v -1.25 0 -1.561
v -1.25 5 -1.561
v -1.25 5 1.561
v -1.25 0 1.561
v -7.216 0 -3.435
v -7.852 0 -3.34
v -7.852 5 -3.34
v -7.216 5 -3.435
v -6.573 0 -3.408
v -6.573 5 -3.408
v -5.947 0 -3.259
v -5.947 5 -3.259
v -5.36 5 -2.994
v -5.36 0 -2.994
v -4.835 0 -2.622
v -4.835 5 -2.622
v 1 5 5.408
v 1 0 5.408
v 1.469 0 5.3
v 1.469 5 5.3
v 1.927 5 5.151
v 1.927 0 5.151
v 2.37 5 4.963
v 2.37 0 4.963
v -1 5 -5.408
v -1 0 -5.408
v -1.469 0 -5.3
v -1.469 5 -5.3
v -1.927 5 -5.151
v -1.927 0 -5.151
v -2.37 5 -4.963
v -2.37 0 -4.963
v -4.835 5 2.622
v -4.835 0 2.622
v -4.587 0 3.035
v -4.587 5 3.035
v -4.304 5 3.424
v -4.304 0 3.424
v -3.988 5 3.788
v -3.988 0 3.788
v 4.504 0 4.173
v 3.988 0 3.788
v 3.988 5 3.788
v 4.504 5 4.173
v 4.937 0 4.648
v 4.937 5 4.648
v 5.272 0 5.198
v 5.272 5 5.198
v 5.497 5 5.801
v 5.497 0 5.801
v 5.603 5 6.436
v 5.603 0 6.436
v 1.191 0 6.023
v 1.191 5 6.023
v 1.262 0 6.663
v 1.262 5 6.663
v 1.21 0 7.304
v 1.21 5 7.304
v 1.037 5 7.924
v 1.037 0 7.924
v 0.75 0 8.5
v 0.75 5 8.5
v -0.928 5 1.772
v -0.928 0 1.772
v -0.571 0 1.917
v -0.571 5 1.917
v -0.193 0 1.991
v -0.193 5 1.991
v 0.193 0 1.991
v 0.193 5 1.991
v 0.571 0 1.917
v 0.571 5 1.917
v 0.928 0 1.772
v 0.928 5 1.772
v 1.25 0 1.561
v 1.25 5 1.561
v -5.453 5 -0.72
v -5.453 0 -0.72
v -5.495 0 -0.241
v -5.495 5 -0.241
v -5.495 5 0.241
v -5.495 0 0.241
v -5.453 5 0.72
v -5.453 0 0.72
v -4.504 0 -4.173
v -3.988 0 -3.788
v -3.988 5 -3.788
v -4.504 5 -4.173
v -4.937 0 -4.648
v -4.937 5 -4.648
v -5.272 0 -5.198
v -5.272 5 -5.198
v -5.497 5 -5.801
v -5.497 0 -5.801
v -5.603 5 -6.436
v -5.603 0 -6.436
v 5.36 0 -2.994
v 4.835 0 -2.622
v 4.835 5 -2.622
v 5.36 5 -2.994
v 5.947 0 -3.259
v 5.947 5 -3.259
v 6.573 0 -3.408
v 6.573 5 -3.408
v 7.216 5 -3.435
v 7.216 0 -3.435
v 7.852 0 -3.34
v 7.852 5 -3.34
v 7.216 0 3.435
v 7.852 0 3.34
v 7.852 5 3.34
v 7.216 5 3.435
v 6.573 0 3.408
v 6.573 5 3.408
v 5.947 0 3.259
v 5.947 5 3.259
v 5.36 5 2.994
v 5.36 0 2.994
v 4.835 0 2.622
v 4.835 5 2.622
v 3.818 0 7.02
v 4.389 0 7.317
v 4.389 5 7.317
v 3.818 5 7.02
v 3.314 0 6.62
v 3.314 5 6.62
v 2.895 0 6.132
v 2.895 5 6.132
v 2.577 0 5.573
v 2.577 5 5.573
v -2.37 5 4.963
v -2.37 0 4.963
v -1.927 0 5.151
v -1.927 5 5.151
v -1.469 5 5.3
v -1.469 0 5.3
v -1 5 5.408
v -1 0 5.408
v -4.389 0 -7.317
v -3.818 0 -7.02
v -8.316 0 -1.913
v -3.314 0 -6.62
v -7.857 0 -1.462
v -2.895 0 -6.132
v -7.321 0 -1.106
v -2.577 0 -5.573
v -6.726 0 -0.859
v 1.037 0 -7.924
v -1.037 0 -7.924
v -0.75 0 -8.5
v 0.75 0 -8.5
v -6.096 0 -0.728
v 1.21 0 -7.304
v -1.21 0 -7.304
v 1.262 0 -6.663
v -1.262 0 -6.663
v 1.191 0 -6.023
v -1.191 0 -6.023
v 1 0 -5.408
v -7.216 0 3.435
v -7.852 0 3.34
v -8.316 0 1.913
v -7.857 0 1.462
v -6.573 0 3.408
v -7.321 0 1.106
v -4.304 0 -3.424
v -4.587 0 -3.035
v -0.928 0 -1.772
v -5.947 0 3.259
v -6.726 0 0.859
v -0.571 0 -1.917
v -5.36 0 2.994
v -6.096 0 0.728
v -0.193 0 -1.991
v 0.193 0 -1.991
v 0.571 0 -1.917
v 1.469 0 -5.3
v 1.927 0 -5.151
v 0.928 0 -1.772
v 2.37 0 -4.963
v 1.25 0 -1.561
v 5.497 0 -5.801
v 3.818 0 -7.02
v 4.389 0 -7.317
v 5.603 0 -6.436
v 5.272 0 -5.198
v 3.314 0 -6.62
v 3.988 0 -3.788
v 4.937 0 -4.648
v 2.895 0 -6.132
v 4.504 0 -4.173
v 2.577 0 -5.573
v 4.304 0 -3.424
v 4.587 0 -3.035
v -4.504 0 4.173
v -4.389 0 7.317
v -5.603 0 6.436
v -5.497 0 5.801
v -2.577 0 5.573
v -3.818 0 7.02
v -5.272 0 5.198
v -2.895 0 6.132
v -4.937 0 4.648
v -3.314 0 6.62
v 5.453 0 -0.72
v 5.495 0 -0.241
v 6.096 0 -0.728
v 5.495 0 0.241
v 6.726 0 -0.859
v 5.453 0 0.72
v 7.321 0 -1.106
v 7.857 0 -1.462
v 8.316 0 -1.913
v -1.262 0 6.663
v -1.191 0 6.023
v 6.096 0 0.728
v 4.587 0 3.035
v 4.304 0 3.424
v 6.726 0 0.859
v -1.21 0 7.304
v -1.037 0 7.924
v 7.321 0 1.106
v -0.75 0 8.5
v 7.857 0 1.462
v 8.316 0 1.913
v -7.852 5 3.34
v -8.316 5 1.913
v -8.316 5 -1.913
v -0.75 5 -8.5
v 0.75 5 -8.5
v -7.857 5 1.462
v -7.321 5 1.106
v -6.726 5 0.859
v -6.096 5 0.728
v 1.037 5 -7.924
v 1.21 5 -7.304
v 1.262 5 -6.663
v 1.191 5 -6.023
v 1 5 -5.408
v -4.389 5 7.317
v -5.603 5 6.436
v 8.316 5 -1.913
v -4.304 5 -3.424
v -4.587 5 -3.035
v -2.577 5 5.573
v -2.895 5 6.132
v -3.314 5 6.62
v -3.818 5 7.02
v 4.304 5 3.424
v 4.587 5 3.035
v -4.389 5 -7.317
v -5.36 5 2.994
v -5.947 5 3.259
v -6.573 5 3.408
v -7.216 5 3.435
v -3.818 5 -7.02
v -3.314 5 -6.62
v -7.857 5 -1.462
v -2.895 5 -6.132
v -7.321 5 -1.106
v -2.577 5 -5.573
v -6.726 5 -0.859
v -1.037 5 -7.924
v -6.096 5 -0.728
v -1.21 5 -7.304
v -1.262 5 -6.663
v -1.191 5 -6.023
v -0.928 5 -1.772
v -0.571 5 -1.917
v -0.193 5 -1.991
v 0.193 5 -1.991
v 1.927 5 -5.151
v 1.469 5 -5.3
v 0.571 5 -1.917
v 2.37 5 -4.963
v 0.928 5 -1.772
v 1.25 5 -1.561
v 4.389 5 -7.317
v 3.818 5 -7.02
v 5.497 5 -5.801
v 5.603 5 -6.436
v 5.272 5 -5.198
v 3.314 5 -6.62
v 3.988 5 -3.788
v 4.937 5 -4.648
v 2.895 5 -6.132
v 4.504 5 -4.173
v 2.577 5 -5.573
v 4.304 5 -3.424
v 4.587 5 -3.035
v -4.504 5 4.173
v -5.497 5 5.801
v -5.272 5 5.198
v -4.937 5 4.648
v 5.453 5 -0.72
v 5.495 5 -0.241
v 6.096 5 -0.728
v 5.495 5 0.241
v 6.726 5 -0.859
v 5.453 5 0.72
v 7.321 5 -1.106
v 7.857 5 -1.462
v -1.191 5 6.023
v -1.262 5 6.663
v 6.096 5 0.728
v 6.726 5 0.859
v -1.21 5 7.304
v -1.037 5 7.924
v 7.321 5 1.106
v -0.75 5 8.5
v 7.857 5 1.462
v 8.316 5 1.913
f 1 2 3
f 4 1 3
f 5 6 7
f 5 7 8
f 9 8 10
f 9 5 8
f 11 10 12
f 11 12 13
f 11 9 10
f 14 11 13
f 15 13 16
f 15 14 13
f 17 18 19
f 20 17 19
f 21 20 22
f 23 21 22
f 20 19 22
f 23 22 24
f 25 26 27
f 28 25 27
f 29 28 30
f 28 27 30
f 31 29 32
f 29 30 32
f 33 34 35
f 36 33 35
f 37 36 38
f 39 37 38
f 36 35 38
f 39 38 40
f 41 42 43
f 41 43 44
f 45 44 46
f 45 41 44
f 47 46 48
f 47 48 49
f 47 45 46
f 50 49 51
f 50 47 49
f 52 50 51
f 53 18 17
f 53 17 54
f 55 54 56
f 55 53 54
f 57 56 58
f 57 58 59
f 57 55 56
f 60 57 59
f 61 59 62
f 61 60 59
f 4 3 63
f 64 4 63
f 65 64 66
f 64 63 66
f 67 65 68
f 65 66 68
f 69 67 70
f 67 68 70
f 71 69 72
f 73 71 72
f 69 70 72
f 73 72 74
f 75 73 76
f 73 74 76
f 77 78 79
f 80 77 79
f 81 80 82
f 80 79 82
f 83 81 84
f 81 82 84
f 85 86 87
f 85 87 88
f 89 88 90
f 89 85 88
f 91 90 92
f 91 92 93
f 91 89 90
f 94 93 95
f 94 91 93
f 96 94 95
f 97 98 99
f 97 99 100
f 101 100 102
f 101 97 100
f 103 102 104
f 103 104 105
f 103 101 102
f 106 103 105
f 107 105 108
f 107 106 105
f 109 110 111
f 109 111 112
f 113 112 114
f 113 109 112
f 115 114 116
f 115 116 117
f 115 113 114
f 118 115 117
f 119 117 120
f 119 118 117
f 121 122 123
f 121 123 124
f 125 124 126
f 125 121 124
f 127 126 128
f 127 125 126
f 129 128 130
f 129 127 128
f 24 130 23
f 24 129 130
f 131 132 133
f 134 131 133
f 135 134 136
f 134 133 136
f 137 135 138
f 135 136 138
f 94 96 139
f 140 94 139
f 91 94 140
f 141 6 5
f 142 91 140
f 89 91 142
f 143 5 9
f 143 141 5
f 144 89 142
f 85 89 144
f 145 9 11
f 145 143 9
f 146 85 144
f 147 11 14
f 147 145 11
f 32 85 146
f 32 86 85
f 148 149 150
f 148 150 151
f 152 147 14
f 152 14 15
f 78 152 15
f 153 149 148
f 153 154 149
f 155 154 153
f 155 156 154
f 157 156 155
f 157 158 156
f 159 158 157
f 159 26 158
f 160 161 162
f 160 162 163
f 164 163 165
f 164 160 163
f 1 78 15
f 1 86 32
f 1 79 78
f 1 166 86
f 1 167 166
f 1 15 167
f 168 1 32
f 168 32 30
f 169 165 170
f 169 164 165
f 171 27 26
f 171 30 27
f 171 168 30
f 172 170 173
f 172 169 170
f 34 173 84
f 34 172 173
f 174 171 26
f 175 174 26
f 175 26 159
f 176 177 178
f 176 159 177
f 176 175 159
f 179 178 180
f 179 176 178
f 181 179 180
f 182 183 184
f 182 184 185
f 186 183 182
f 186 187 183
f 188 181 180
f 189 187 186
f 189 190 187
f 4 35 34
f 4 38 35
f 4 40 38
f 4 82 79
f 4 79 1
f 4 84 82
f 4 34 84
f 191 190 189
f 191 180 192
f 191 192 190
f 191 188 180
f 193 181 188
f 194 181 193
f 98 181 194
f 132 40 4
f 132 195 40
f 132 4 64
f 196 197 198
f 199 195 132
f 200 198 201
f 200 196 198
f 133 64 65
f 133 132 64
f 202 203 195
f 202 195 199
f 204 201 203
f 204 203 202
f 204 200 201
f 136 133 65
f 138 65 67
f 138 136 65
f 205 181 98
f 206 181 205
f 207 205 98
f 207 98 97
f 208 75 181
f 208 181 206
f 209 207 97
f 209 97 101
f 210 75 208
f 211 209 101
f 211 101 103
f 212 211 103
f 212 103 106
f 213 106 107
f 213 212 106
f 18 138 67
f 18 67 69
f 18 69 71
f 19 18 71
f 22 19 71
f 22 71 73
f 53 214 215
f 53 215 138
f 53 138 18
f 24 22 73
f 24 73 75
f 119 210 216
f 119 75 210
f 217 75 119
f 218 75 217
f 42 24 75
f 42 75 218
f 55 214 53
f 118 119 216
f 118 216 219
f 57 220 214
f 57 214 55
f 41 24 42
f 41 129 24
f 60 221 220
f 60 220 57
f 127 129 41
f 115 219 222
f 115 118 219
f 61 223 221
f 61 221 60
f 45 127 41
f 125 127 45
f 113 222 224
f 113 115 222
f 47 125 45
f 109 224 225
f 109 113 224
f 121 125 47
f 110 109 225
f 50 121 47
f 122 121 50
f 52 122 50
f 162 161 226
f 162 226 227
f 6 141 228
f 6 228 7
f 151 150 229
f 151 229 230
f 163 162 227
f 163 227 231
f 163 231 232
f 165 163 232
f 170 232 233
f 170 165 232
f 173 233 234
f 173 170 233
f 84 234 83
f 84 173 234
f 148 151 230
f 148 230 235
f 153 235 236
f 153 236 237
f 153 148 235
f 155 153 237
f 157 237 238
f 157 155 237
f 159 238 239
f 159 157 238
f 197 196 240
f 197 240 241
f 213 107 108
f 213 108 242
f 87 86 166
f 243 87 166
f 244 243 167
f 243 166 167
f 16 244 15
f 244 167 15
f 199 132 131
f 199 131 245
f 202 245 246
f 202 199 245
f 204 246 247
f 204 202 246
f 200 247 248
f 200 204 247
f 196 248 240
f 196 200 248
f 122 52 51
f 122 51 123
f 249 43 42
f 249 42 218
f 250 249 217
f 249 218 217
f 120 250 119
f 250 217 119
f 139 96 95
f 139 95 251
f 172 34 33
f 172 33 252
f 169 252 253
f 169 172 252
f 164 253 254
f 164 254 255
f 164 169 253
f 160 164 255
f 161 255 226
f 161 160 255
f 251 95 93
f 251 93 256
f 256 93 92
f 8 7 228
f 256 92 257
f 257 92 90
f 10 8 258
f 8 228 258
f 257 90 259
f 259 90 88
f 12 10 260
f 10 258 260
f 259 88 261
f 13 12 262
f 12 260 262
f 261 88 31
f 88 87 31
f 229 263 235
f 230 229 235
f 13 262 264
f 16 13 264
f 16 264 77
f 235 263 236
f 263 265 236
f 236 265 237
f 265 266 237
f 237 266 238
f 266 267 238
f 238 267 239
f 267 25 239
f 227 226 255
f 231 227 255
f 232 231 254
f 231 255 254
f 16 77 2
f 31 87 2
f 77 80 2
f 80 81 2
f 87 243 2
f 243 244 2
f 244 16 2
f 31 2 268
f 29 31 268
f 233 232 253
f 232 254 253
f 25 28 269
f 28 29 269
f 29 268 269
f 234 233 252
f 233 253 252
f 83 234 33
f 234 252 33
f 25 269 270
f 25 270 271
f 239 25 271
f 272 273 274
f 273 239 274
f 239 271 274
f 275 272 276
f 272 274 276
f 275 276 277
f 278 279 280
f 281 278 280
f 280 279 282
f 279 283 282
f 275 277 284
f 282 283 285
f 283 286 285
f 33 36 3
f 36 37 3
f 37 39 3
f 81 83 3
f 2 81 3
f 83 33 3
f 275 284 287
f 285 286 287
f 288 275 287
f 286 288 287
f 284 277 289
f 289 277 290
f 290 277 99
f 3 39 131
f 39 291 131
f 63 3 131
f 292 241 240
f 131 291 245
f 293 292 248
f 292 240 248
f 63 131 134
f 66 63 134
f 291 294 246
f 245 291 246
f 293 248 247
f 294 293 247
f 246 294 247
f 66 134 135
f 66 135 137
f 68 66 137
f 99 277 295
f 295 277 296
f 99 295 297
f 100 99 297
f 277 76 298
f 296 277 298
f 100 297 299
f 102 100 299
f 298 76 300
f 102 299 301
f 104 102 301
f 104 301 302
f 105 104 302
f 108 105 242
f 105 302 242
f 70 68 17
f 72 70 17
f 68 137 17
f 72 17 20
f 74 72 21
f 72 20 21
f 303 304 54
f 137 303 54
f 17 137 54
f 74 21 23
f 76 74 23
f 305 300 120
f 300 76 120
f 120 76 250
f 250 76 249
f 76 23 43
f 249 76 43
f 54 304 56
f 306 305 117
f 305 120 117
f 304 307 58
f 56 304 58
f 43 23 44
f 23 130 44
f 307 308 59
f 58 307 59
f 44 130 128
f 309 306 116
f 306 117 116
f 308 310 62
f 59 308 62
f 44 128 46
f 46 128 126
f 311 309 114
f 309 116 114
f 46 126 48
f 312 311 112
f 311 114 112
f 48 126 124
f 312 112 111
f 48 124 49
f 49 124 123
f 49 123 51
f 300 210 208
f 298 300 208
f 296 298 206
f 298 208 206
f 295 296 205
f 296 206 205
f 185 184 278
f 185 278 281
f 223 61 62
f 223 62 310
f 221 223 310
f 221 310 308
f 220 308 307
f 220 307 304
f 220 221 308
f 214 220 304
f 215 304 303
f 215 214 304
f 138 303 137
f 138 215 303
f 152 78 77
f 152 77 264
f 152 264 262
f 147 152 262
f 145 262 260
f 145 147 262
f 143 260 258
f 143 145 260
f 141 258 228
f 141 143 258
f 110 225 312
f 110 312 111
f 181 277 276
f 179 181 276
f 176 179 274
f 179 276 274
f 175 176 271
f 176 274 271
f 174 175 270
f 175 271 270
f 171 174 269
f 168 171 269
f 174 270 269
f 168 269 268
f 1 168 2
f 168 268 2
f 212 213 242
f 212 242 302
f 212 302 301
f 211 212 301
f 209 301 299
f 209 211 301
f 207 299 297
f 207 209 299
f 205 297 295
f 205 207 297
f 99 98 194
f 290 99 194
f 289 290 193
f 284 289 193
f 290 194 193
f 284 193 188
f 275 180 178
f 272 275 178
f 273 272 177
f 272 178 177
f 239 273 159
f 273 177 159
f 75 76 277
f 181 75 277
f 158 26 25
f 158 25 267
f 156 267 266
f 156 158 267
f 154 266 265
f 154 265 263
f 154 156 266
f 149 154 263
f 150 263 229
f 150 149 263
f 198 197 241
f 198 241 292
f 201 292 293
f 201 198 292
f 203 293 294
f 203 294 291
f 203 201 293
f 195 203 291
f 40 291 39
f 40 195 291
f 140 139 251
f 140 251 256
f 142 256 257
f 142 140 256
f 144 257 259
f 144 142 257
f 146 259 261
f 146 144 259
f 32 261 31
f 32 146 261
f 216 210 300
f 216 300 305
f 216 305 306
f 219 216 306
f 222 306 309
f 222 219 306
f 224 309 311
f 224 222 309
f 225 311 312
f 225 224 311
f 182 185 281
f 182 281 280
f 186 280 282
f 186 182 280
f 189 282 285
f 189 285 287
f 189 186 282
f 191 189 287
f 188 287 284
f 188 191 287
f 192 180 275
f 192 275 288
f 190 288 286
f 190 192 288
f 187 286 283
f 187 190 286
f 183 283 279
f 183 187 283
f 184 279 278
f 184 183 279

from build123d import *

# Parameters (mm, degrees)
SKETCH_1_R          = 5.5
EXTRUDE_1_DEPTH     = 5
EXTRUDE_START       = -5
EXTRUDE_2_DEPTH     = 5
CUT_EXTRUDE_1_REACH = 14.9


with BuildPart() as part:
    # 草图1 → 凸台-拉伸1 (new body)
    with BuildSketch(Plane(origin=(0, 0, 0), x_dir=(1, 0, 0), z_dir=(0, 1, 0))):
        with Locations(Location((0, 0, 0), (0, 0, 270))):
            Circle(SKETCH_1_R)
    extrude(amount=EXTRUDE_1_DEPTH)

    # 草图2 → 凸台-拉伸2 (add)
    with BuildSketch(Plane(origin=(0, 5, 0), x_dir=(-1, 0, 0), z_dir=(0, 1, 0)).offset(EXTRUDE_START)):
        with BuildLine():
            Line((-4.389411899, -7.317483391), (-5.60293739, -6.435805513))
            ThreePointArc((-5.60293739, -6.435805513), (-5.11774735, -4.915167527), (-3.987951794, -3.787643132))
            ThreePointArc((-3.987951794, -3.787643132), (-3.232818888, -4.449593469), (-2.369917805, -4.963213636))
            ThreePointArc((-2.369917805, -4.963213636), (-3.093131201, -6.386137262), (-4.389411899, -7.317483391))
        make_face()
        with BuildLine():
            Line((-7.852217643, -3.339936839), (-8.315743134, -1.913352065))
            ThreePointArc((-8.315743134, -1.913352065), (-7.029407564, -0.968317642), (-5.452641547, -0.720208411))
            ThreePointArc((-5.452641547, -0.720208411), (-5.23081084, -1.699593469), (-4.834607559, -2.622321444))
            ThreePointArc((-4.834607559, -2.622321444), (-6.256073009, -3.34839667), (-7.852217643, -3.339936839))
        make_face()
        with BuildLine():
            Line((-8.315743134, 1.913352065), (-7.852217643, 3.339936839))
            ThreePointArc((-7.852217643, 3.339936839), (-6.256073009, 3.34839667), (-4.834607559, 2.622321444))
            ThreePointArc((-4.834607559, 2.622321444), (-5.23081084, 1.699593469), (-5.452641547, 0.720208411))
            ThreePointArc((-5.452641547, 0.720208411), (-7.029407564, 0.968317642), (-8.315743134, 1.913352065))
        make_face()
        with BuildLine():
            Line((-5.60293739, 6.435805513), (-4.389411899, 7.317483391))
            ThreePointArc((-4.389411899, 7.317483391), (-3.093131201, 6.386137262), (-2.369917805, 4.963213636))
            ThreePointArc((-2.369917805, 4.963213636), (-3.232818888, 4.449593469), (-3.987951794, 3.787643132))
            ThreePointArc((-3.987951794, 3.787643132), (-5.11774735, 4.915167527), (-5.60293739, 6.435805513))
        make_face()
        with BuildLine():
            Line((-0.75, 8.5), (0.75, 8.5))
            ThreePointArc((0.75, 8.5), (1.251281594, 6.984590476), (1, 5.408326913))
            ThreePointArc((1, 5.408326913), (0, 5.5), (-1, 5.408326913))
            ThreePointArc((-1, 5.408326913), (-1.251281594, 6.984590476), (-0.75, 8.5))
        make_face()
        with BuildLine():
            Line((4.389411899, 7.317483391), (5.60293739, 6.435805513))
            ThreePointArc((5.60293739, 6.435805513), (5.11774735, 4.915167527), (3.987951794, 3.787643132))
            ThreePointArc((3.987951794, 3.787643132), (3.232818888, 4.449593469), (2.369917805, 4.963213636))
            ThreePointArc((2.369917805, 4.963213636), (3.093131201, 6.386137262), (4.389411899, 7.317483391))
        make_face()
        with BuildLine():
            Line((0.75, -8.5), (-0.75, -8.5))
            ThreePointArc((-0.75, -8.5), (-1.251281594, -6.984590476), (-1, -5.408326913))
            ThreePointArc((-1, -5.408326913), (0, -5.5), (1, -5.408326913))
            ThreePointArc((1, -5.408326913), (1.251281594, -6.984590476), (0.75, -8.5))
        make_face()
        with BuildLine():
            Line((7.852217643, 3.339936839), (8.315743134, 1.913352065))
            ThreePointArc((8.315743134, 1.913352065), (7.029407564, 0.968317642), (5.452641547, 0.720208411))
            ThreePointArc((5.452641547, 0.720208411), (5.23081084, 1.699593469), (4.834607559, 2.622321444))
            ThreePointArc((4.834607559, 2.622321444), (6.256073009, 3.34839667), (7.852217643, 3.339936839))
        make_face()
        with BuildLine():
            Line((8.315743134, -1.913352065), (7.852217643, -3.339936839))
            ThreePointArc((7.852217643, -3.339936839), (6.256073009, -3.34839667), (4.834607559, -2.622321444))
            ThreePointArc((4.834607559, -2.622321444), (5.23081084, -1.699593469), (5.452641547, -0.720208411))
            ThreePointArc((5.452641547, -0.720208411), (7.029407564, -0.968317642), (8.315743134, -1.913352065))
        make_face()
        with BuildLine():
            Line((5.60293739, -6.435805513), (4.389411899, -7.317483391))
            ThreePointArc((4.389411899, -7.317483391), (3.093131201, -6.386137262), (2.369917805, -4.963213636))
            ThreePointArc((2.369917805, -4.963213636), (3.232818888, -4.449593469), (3.987951794, -3.787643132))
            ThreePointArc((3.987951794, -3.787643132), (5.11774735, -4.915167527), (5.60293739, -6.435805513))
        make_face()
    extrude(amount=EXTRUDE_2_DEPTH)

    # 草图3 → 切除-拉伸1 (cut, up to next)
    with BuildSketch(Plane(origin=(0, 5, 0), x_dir=(-1, 0, 0), z_dir=(0, 1, 0)), mode=Mode.PRIVATE) as cut_extrude_1_sk1:
        with BuildLine():
            Line((1.25, -1.5612495), (1.25, 1.5612495))
            ThreePointArc((1.25, 1.5612495), (0, 2), (-1.25, 1.5612495))
            Line((-1.25, 1.5612495), (-1.25, -1.5612495))
            ThreePointArc((-1.25, -1.5612495), (0, -2), (1.25, -1.5612495))
        make_face()
    cut_extrude_1_tool1 = extrude(cut_extrude_1_sk1.sketch, amount=-CUT_EXTRUDE_1_REACH, mode=Mode.PRIVATE) & part.part
    add(cut_extrude_1_tool1.solids().sort_by_distance((0, 5, 0))[0], mode=Mode.SUBTRACT)


solid = part.part
